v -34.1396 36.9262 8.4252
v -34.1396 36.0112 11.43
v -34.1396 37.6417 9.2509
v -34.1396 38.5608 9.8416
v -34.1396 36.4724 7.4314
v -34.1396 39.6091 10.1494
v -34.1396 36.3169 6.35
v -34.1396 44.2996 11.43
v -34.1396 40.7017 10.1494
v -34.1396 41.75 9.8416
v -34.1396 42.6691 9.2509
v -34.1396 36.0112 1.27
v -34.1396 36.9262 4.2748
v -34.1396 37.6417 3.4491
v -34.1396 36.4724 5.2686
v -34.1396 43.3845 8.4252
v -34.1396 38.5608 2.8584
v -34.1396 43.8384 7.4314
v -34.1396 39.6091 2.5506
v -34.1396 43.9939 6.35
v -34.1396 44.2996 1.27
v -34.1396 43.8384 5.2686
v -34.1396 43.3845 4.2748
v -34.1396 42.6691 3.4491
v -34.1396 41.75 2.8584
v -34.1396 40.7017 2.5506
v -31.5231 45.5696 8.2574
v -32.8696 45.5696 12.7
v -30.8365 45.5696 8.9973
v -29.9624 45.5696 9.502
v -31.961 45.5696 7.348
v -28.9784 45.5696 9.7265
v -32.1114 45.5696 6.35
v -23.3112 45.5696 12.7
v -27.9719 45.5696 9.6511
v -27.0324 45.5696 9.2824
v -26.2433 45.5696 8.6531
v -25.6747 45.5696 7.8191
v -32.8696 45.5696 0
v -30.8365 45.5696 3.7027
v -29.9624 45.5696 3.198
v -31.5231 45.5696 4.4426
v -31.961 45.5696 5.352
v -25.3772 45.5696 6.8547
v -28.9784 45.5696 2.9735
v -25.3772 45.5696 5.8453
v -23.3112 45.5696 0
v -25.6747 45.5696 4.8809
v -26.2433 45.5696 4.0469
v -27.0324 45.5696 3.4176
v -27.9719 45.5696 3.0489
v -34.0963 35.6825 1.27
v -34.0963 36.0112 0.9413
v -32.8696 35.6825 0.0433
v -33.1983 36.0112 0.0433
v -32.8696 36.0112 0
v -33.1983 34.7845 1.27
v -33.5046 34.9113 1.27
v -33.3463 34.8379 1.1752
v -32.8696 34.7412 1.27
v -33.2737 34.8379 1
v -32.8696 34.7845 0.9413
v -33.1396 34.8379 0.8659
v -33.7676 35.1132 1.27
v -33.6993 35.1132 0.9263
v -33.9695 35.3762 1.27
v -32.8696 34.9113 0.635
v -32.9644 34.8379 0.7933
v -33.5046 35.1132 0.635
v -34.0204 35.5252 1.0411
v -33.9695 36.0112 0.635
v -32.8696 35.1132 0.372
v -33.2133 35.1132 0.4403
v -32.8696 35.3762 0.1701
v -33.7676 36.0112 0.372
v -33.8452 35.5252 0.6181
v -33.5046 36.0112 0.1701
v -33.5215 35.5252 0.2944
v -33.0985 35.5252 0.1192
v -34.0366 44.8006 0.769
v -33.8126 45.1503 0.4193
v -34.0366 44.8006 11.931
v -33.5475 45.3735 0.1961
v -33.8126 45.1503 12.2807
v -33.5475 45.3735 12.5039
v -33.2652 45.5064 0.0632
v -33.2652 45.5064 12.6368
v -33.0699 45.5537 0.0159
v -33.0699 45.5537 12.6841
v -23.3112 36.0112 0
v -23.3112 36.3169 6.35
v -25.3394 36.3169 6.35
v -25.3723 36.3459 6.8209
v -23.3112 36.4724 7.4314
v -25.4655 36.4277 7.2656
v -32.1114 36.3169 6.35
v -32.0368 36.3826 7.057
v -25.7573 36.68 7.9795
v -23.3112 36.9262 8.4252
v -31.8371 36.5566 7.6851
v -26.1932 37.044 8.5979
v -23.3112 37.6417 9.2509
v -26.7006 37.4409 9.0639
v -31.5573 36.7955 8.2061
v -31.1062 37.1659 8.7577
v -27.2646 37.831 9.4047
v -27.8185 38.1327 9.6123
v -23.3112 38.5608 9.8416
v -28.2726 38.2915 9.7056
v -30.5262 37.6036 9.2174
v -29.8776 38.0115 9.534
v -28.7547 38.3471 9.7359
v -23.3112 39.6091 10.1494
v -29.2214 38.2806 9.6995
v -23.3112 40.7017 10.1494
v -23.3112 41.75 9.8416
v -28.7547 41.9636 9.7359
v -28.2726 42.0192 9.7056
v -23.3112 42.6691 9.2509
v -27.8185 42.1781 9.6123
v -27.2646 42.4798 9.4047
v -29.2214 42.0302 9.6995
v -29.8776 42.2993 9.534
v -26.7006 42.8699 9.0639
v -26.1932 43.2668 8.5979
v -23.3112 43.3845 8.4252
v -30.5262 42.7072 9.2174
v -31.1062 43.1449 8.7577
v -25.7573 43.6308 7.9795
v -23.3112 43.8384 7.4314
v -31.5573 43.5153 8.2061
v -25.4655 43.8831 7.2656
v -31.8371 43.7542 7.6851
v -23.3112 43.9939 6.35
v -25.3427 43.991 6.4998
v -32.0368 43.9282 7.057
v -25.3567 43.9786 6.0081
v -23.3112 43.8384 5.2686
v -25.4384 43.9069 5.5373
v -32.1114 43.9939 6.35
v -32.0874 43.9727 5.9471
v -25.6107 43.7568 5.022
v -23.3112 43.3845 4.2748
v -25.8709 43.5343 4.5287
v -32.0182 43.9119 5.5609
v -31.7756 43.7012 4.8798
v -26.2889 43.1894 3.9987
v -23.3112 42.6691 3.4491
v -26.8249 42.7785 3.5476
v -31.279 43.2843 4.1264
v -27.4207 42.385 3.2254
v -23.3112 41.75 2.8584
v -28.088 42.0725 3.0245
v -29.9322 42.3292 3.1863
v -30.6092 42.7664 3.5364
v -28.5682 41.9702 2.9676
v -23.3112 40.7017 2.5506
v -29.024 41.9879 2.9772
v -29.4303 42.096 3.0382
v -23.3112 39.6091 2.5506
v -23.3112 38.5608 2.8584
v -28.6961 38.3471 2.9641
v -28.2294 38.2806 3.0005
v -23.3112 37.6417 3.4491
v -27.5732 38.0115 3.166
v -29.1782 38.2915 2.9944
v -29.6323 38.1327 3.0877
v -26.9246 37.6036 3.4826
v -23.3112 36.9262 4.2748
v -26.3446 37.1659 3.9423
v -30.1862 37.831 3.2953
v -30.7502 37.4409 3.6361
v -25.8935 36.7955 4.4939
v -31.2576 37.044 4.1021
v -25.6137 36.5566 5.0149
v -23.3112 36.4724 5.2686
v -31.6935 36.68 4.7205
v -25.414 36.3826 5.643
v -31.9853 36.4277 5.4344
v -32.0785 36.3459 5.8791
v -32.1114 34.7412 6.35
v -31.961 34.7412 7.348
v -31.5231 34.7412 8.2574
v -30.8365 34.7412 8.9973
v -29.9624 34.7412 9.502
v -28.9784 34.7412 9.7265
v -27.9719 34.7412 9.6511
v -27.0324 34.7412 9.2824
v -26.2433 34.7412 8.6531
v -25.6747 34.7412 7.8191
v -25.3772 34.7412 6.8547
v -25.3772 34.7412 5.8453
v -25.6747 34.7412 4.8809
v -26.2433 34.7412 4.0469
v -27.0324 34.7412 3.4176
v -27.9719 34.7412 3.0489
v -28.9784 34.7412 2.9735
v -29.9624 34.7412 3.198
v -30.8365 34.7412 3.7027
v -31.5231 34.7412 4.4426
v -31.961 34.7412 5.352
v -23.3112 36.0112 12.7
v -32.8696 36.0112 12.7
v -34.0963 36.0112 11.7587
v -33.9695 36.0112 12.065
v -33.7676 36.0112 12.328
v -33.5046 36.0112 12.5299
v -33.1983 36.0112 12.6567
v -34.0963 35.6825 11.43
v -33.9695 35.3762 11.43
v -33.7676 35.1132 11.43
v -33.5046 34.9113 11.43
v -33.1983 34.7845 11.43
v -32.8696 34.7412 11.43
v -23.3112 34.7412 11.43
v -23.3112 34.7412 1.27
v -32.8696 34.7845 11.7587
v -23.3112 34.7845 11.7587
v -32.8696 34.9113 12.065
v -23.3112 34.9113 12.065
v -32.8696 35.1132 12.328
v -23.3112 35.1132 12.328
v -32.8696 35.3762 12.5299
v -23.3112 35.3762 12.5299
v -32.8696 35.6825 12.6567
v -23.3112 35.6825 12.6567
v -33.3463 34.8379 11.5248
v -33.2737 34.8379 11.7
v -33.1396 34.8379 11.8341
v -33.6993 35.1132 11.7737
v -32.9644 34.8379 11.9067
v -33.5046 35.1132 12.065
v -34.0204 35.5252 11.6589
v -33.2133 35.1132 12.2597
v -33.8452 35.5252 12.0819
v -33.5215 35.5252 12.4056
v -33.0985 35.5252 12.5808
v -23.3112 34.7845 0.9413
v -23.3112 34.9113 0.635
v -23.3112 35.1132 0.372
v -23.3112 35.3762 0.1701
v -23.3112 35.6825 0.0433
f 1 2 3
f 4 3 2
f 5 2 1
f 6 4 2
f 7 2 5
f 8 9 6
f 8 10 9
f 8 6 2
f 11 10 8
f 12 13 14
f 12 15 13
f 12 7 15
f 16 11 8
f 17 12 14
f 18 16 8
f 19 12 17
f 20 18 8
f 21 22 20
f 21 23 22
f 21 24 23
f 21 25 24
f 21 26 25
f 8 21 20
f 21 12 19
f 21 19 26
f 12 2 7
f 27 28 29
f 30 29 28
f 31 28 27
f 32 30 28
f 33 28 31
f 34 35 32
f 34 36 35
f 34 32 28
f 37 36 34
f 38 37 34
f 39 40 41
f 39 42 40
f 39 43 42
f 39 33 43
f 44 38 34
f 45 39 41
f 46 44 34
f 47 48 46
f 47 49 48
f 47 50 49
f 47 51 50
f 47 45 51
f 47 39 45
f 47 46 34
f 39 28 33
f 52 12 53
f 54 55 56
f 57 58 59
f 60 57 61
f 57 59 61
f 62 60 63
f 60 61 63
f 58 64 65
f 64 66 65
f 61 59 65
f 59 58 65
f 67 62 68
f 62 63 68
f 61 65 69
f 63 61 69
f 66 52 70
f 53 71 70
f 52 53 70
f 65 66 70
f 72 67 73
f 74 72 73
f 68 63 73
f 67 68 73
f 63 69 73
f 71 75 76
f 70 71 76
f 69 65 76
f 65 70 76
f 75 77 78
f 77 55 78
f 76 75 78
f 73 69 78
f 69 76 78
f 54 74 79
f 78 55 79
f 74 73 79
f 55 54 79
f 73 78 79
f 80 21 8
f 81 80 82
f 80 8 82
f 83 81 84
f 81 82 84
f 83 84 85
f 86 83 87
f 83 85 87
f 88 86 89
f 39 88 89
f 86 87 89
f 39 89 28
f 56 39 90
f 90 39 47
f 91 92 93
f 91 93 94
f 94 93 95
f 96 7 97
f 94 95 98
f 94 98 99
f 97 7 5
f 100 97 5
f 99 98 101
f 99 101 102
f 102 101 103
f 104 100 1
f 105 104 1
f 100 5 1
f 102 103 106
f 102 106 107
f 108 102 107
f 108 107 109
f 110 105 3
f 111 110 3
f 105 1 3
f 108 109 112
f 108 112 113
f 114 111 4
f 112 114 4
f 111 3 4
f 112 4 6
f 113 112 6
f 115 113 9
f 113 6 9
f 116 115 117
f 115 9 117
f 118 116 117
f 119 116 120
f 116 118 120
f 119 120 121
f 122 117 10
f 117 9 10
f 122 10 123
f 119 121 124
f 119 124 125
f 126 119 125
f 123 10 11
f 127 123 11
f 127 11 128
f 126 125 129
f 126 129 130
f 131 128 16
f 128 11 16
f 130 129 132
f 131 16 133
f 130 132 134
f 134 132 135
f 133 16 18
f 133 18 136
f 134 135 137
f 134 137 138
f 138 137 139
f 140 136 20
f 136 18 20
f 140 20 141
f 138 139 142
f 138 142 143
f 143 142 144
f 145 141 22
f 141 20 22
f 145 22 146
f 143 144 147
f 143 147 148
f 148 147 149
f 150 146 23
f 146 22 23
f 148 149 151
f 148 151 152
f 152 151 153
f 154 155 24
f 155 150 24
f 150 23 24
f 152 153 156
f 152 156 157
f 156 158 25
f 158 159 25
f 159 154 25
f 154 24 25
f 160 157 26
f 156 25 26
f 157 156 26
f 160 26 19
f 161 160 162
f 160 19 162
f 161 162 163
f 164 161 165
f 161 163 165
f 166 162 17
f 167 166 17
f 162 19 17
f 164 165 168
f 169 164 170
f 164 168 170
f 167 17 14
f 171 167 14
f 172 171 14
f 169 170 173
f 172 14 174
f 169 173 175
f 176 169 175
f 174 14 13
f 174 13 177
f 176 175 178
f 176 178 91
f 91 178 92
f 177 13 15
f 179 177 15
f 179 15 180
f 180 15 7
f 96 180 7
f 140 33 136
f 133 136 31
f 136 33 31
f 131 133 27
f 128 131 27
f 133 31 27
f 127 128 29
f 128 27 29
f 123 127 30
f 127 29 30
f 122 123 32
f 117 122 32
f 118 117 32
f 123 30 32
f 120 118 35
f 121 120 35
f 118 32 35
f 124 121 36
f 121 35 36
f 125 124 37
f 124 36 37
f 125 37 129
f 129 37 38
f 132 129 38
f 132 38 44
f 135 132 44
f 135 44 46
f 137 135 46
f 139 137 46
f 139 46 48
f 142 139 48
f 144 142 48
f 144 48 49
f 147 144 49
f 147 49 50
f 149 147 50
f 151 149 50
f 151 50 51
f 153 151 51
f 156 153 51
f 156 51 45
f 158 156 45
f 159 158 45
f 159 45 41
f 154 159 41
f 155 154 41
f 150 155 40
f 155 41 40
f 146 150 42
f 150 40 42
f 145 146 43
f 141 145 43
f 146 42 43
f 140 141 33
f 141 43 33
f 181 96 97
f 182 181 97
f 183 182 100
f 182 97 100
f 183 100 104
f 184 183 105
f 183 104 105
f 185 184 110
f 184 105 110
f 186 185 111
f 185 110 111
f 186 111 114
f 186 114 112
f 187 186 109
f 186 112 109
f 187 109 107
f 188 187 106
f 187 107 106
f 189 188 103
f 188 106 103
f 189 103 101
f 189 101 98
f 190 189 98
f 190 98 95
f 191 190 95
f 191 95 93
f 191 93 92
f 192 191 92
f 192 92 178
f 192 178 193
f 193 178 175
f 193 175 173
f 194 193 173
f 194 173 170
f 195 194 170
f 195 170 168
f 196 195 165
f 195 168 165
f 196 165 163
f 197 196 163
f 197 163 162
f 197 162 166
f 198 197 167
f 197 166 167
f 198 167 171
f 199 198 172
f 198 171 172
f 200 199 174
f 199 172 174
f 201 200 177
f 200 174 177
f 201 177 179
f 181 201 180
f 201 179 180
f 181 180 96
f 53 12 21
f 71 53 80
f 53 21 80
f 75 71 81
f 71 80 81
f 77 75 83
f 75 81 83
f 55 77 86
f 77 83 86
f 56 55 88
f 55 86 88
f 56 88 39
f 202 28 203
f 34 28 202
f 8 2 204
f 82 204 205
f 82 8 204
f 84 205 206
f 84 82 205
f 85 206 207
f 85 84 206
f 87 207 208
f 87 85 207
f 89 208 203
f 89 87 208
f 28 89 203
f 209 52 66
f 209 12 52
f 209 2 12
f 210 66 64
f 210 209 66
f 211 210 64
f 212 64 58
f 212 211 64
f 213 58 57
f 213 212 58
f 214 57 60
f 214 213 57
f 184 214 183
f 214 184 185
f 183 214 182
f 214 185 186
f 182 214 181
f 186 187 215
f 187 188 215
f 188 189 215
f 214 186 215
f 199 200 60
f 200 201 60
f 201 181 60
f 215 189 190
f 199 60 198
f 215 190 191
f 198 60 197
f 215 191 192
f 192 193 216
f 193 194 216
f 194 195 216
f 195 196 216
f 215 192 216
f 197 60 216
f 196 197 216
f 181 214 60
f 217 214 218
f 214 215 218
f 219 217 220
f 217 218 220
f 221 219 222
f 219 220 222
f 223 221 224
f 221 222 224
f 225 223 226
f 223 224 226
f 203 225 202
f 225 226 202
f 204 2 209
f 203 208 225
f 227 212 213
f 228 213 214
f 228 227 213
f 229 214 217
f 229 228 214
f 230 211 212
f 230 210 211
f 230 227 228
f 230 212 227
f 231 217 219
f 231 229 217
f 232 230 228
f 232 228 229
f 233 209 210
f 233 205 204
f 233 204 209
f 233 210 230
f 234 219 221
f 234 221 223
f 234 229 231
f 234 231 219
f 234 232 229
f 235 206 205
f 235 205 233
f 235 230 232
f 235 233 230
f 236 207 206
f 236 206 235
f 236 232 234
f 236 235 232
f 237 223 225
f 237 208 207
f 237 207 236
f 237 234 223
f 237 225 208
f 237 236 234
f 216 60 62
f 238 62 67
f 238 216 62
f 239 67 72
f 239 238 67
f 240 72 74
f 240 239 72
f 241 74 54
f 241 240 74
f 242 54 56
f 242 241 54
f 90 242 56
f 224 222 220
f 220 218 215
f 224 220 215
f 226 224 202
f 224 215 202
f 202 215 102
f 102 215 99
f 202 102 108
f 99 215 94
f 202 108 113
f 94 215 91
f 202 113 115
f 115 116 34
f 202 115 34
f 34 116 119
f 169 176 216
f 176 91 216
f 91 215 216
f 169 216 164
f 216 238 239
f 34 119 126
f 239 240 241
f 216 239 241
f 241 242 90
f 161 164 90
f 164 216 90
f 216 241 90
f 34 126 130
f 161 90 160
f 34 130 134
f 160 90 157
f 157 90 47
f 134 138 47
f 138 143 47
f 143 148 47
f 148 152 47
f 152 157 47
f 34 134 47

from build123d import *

# Parameters (mm, degrees)
F0_W     = 10.828417
F0_H     = 10.828416
F1_DEPTH = 12.7
F2_R     = 3.838495
F3_DEPTH = 25.4
F4_R     = 3.386017
F5_DEPTH = 25.4
F6_R     = 1.27


with BuildPart() as f1:
    # F0 (on Top) → F1 (new body)
    with BuildSketch(Plane.XY):
        with Locations((-28.725398, 40.155394)):
            Rectangle(F0_W, F0_H)
    extrude(amount=F1_DEPTH)

    # F2 (on face) → F3 (cut)
    with BuildSketch(Plane(origin=(-34.139607, 0, 0), x_dir=(0, -1, 0), z_dir=(-1, 0, 0))):
        with Locations((-40.155394, 6.35)):
            Circle(F2_R)
    extrude(amount=-F3_DEPTH, mode=Mode.SUBTRACT)

    # F4 (on face) → F5 (cut)
    with BuildSketch(Plane(origin=(0, 45.569602, 0), x_dir=(-1, 0, 0), z_dir=(0, 1, 0))):
        with Locations((28.725399, 6.35)):
            Circle(F4_R)
    extrude(amount=-F5_DEPTH, mode=Mode.SUBTRACT)

    # F6
    f6_edges = [f1.edges().sort_by_distance(p)[0] for p in [
        (-34.139607, 40.155394, 12.7),
        (-34.139607, 45.569602, 6.35),
        (-34.139607, 40.155394, 0),
        (-34.139607, 34.741186, 6.35),
        (-28.725399, 34.741186, 12.7),
        (-28.725399, 34.741186, 0),
    ]]
    fillet(f6_edges, radius=F6_R)


solid = f1.part
